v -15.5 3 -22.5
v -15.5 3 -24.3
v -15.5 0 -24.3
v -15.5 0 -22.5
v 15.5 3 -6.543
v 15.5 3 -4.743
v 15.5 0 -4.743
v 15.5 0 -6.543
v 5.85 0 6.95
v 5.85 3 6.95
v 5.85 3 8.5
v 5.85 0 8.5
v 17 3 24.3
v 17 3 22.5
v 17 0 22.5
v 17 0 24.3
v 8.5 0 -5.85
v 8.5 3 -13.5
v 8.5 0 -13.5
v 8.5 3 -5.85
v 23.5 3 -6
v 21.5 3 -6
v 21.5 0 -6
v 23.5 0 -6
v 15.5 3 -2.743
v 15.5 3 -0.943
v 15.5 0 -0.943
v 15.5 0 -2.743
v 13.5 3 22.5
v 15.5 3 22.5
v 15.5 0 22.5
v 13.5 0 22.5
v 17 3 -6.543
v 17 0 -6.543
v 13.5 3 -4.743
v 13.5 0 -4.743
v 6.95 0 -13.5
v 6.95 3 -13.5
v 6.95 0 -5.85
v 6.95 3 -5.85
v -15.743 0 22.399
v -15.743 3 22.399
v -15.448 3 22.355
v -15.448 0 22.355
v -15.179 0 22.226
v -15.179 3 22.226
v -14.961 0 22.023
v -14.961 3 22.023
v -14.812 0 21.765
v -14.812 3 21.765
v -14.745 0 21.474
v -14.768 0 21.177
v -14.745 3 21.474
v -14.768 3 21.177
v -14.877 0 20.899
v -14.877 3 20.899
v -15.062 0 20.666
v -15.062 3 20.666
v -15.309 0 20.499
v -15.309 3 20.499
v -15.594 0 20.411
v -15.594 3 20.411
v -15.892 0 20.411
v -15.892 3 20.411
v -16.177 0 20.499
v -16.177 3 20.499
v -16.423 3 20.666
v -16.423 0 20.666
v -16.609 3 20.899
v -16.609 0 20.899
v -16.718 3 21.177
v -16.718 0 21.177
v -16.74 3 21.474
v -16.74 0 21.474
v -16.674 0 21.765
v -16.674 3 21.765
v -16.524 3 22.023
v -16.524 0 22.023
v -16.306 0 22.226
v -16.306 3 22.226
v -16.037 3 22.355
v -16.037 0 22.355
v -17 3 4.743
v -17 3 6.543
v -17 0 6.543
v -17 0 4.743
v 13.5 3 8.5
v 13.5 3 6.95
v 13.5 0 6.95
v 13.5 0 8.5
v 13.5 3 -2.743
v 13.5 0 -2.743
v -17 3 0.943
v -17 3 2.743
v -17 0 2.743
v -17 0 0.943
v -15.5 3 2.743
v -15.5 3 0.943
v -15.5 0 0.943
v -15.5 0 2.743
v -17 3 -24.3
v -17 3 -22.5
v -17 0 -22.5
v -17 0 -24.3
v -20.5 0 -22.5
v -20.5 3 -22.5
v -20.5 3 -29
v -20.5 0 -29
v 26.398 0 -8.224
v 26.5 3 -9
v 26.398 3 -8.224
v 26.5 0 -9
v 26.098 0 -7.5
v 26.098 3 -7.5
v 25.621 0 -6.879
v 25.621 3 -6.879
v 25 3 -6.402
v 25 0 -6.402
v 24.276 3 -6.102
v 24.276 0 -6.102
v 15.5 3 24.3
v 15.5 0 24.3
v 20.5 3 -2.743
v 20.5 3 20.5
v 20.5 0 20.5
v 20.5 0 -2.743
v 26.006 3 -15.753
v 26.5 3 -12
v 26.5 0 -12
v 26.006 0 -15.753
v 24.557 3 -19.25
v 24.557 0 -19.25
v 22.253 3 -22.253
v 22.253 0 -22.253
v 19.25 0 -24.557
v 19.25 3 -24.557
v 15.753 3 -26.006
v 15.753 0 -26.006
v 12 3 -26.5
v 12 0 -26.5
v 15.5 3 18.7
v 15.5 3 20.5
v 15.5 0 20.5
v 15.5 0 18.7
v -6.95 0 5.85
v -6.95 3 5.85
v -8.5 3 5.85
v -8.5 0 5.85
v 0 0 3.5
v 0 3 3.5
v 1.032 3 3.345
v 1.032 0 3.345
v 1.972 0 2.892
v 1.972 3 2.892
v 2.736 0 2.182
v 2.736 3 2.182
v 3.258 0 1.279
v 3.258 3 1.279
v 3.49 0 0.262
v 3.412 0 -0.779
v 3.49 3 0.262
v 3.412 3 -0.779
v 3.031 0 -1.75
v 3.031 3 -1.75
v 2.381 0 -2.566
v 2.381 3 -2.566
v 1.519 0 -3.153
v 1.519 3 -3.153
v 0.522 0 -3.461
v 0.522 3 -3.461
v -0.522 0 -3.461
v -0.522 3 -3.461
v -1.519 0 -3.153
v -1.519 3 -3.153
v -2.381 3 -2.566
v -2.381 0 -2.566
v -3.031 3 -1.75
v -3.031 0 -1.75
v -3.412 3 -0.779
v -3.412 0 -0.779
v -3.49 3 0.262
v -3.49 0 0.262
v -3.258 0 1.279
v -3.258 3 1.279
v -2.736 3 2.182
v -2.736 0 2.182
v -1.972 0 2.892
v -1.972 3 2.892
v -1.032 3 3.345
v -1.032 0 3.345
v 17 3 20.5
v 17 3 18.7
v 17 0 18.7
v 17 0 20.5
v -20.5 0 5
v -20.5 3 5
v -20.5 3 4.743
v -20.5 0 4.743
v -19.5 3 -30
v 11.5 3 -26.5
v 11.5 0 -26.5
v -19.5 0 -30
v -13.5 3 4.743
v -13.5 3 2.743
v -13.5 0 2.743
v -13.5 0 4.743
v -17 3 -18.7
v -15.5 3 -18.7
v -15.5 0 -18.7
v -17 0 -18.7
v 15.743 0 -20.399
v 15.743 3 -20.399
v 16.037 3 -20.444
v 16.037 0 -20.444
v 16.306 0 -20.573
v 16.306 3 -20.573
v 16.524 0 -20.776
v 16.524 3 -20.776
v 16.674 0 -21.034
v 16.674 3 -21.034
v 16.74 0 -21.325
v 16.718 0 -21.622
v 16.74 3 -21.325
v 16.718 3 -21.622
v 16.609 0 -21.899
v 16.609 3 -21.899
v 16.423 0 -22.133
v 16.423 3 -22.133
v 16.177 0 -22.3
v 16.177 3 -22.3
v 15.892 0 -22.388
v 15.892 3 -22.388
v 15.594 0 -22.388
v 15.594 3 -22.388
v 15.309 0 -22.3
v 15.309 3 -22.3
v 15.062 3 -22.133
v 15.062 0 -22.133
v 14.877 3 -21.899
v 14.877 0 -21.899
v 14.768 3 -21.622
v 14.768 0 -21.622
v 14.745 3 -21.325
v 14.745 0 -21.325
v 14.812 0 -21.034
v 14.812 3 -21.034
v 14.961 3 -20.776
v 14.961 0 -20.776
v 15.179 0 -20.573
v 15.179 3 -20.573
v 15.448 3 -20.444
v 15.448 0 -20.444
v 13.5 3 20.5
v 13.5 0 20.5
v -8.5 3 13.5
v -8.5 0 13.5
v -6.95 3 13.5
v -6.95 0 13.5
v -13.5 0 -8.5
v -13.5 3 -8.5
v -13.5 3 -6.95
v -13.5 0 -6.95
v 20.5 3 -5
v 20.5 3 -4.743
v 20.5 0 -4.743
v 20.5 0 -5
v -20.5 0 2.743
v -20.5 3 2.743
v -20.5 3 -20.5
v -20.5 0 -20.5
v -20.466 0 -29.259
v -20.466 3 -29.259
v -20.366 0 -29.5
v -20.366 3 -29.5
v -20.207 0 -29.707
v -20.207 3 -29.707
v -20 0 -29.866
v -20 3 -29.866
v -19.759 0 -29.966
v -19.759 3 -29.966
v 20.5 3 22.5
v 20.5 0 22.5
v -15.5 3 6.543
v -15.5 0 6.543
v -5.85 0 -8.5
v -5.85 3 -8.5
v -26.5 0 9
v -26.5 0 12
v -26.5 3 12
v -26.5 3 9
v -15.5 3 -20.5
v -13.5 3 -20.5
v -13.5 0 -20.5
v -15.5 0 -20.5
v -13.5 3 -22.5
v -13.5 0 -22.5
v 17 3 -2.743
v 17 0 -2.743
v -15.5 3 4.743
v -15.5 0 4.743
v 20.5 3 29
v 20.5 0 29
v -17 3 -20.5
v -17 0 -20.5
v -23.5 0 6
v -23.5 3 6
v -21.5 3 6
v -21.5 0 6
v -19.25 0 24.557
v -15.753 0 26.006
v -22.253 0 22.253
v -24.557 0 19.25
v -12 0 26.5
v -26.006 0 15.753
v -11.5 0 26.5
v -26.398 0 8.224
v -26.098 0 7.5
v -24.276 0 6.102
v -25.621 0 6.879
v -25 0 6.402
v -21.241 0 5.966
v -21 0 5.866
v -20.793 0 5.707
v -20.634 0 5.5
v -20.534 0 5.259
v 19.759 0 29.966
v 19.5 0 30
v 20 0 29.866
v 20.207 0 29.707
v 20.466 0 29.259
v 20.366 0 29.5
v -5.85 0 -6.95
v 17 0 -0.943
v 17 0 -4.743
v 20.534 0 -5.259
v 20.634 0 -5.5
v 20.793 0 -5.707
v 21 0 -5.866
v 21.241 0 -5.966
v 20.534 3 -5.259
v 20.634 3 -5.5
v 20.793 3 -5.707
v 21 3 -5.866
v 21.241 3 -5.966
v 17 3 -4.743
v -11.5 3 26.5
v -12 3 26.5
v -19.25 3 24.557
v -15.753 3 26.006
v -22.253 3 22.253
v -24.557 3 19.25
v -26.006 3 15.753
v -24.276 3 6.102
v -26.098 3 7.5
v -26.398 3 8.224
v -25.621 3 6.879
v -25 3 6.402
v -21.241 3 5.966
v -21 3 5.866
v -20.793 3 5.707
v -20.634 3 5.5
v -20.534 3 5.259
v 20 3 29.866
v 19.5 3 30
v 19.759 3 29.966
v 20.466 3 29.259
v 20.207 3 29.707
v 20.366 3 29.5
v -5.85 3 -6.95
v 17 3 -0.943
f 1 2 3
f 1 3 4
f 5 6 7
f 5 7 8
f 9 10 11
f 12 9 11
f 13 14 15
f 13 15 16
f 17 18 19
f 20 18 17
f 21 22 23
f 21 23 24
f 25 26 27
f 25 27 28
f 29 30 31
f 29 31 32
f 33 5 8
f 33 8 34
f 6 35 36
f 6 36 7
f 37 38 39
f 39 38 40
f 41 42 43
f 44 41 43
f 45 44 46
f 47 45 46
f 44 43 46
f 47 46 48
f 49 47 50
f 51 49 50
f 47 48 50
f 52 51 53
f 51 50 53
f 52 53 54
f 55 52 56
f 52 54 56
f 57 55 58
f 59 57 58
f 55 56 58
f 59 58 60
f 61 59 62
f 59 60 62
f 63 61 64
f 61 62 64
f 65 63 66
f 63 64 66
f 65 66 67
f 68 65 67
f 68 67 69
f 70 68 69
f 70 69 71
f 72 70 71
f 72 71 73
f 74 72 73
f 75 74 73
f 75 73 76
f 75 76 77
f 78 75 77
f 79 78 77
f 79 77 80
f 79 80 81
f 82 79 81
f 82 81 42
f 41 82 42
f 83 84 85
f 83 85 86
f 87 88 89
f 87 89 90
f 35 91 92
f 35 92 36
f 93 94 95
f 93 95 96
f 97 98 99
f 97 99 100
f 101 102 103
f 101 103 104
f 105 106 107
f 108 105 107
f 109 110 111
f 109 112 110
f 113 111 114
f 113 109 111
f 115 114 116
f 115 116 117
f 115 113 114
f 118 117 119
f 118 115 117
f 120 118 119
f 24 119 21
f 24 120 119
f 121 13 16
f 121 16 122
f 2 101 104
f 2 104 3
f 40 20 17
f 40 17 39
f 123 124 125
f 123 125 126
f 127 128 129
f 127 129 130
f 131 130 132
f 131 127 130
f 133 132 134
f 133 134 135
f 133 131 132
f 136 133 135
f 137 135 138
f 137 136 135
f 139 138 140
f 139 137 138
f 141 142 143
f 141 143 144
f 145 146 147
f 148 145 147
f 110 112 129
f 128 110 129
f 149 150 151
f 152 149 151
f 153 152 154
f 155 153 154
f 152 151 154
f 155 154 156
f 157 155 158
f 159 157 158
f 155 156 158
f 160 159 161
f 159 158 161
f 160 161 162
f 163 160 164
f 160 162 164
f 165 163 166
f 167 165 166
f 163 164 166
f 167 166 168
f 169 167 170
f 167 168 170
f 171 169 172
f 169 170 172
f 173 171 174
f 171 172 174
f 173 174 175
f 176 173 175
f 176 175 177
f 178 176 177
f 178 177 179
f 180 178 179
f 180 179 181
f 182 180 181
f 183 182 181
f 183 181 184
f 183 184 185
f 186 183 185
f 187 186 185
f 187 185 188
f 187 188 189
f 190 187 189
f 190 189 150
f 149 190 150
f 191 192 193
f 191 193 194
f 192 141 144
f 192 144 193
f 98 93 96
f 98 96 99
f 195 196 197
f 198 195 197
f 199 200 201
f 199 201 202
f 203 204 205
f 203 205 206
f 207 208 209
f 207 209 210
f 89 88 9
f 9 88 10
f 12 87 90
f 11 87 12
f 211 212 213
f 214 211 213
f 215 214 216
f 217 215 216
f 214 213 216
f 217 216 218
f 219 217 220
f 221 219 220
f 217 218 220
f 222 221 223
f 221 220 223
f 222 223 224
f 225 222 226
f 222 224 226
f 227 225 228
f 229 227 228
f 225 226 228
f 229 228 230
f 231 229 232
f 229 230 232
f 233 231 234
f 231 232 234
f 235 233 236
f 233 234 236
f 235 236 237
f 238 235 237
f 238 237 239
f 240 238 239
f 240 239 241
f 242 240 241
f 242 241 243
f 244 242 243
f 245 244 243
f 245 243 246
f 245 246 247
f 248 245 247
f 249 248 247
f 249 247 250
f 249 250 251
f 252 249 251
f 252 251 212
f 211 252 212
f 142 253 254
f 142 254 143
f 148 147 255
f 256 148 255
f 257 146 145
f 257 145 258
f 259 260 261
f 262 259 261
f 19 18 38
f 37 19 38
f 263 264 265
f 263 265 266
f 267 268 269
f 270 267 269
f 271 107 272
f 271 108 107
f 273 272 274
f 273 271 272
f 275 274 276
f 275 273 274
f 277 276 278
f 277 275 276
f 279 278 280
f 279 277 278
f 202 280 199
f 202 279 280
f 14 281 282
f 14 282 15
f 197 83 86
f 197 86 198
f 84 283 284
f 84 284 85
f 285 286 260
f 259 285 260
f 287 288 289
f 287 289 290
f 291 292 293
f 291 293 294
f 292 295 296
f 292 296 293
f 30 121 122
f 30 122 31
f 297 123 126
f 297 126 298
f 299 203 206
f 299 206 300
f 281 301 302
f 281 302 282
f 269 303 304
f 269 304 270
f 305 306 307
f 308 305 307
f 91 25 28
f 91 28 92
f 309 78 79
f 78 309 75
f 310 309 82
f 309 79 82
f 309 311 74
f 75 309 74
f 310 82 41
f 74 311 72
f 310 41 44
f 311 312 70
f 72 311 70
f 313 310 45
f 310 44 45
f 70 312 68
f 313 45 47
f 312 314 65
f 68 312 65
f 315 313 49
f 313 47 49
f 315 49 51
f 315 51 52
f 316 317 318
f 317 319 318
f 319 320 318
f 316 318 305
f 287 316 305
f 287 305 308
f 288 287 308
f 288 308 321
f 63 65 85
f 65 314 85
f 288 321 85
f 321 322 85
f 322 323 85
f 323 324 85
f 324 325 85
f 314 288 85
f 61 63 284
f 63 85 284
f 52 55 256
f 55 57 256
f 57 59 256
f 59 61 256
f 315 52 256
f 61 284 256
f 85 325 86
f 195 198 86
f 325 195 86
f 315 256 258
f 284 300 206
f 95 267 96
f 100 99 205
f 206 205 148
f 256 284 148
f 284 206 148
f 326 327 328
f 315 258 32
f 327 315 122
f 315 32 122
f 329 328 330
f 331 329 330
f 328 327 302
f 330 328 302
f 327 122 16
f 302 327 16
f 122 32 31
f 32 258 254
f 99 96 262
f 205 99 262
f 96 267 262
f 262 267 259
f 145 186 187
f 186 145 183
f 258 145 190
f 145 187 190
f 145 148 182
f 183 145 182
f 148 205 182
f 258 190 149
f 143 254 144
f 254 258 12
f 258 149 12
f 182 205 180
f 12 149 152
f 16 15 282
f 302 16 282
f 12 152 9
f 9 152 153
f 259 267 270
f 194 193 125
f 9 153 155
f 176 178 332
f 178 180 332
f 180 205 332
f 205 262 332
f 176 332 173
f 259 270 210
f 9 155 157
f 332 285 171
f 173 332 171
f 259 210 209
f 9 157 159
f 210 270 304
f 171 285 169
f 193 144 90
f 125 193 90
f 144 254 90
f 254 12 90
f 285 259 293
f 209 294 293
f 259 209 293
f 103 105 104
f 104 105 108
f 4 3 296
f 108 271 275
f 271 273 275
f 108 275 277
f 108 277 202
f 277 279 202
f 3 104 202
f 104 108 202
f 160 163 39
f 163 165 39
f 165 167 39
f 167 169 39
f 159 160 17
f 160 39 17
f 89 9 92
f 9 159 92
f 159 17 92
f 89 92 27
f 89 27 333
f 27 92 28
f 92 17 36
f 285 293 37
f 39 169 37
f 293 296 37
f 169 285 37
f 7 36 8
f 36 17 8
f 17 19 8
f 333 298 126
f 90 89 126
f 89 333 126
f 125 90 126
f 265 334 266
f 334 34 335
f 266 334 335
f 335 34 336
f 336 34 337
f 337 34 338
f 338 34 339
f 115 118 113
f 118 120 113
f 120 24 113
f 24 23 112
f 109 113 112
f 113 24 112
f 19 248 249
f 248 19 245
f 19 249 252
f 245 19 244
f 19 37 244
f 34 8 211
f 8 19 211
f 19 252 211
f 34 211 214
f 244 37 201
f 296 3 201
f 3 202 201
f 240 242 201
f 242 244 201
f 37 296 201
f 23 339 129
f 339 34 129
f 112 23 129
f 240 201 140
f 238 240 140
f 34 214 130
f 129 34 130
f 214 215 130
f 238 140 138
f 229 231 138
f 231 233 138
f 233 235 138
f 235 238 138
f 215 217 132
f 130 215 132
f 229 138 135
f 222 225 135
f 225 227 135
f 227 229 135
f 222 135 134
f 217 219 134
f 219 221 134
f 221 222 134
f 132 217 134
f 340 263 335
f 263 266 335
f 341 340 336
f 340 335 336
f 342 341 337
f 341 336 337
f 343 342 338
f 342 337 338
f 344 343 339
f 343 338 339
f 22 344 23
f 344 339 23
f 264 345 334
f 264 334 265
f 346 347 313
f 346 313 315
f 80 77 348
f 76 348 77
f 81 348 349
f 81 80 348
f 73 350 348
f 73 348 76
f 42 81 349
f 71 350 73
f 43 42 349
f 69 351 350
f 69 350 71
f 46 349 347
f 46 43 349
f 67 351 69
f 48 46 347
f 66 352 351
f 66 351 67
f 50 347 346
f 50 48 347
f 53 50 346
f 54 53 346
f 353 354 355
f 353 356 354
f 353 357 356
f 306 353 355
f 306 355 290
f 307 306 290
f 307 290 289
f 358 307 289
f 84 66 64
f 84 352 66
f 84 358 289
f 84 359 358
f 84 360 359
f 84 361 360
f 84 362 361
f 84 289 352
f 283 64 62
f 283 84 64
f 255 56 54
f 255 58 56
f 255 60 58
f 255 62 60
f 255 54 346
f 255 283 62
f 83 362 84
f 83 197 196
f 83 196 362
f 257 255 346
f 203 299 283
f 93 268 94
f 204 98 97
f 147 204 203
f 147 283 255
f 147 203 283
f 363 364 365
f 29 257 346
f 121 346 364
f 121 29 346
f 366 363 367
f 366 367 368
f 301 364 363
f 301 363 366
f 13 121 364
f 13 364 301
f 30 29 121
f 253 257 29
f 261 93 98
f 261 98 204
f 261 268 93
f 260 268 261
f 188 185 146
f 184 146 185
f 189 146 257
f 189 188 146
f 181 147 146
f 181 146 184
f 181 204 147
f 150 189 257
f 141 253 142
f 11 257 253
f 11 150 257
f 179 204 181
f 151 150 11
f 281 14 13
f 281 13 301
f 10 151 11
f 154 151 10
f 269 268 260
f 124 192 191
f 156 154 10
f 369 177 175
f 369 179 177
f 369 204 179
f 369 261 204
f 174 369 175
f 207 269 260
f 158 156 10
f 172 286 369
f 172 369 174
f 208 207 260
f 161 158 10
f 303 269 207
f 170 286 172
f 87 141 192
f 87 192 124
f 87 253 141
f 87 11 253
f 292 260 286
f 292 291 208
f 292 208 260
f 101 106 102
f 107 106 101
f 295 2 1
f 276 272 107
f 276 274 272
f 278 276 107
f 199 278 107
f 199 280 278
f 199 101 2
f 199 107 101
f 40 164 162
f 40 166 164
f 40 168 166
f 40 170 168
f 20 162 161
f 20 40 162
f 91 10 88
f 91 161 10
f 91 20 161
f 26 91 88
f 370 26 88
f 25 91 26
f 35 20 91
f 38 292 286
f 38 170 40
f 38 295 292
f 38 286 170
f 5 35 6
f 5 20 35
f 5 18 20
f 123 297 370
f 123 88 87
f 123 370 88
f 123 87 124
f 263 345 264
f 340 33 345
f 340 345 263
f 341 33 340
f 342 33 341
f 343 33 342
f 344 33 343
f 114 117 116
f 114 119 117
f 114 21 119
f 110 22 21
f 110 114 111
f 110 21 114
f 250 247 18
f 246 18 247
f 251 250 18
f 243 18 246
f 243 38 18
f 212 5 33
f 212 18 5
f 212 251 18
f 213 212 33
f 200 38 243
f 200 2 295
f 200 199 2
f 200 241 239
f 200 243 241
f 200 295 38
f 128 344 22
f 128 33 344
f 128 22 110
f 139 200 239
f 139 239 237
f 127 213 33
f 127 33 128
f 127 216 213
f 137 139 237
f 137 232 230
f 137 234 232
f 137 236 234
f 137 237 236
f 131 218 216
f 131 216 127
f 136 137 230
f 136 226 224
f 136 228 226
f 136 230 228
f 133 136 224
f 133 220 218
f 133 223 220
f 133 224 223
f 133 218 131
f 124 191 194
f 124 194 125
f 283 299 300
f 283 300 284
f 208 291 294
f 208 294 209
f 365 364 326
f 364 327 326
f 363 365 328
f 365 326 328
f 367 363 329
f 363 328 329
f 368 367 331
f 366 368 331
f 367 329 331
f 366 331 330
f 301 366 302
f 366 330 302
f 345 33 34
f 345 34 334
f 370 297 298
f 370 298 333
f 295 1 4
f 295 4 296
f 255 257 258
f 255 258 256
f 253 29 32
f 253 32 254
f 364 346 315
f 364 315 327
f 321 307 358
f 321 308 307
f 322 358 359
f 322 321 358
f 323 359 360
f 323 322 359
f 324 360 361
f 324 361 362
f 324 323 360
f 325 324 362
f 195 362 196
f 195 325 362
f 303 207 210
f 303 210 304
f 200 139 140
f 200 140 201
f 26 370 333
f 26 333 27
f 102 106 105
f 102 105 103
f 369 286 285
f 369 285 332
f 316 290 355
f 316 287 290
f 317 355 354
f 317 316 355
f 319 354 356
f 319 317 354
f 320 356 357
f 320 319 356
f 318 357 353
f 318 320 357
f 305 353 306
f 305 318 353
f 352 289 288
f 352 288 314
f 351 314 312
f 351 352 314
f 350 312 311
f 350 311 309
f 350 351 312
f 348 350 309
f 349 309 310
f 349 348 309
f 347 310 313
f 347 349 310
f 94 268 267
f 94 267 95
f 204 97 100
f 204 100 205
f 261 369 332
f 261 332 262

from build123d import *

# Parameters (mm, degrees)
ESBO_O1_W                = 53
ESBO_O1_H                = 60
RESSALTO_EXTRUS_O1_DEPTH = 3
ESBO_O4_W                = 1.55
ESBO_O4_H                = 7.65
ESBO_O4_W_2              = 7.65
ESBO_O4_H_2              = 1.55
CORTE_EXTRUS_O2_DEPTH    = 10
ESBO_O5_R                = 1
CORTE_EXTRUS_O3_DEPTH    = 41.140378673
ESBO_O7_R                = 3.5
CORTE_EXTRUS_O6_DEPTH    = 41.140378673
ESBO_O8_W                = 6
ESBO_O8_H                = 36
CORTE_EXTRUS_O7_DEPTH    = 41.140378673
FILETE2_R                = 3
FILETE3_R                = 1
CORTE_EXTRUS_O8_DEPTH    = 41.140378673
CORTE_EXTRUS_O9_DEPTH    = 41.140378673


with BuildPart() as part:
    # Esboço1 → Ressalto-extrusão1 (new body)
    with BuildSketch(Plane(origin=(0, 0, 0), x_dir=(1, 0, 0), z_dir=(0, 1, 0))):
        Rectangle(ESBO_O1_W, ESBO_O1_H)
    extrude(amount=RESSALTO_EXTRUS_O1_DEPTH)

    # Esboço4 → Corte-extrusão2 (cut)
    with BuildSketch(Plane(origin=(0, 3, 0), x_dir=(-1, 0, 0), z_dir=(0, 1, 0))):
        with Locations((-7.725, -9.675)):
            Rectangle(ESBO_O4_W, ESBO_O4_H)
        with Locations((-9.675, 7.725)):
            Rectangle(ESBO_O4_W_2, ESBO_O4_H_2)
        with Locations((7.725, 9.675)):
            Rectangle(ESBO_O4_W, ESBO_O4_H)
        with Locations((9.675, -7.725)):
            Rectangle(ESBO_O4_W_2, ESBO_O4_H_2)
    extrude(amount=-CORTE_EXTRUS_O2_DEPTH, mode=Mode.SUBTRACT)

    # Esboço5 → Corte-extrusão3 (cut, through all)
    with BuildSketch(Plane(origin=(0, 3, 0), x_dir=(1, 0, 0), z_dir=(0, 1, 0))):
        with Locations(Location((-15.742640687, -21.399494937, 0), (0, 0, 270))):
            Circle(ESBO_O5_R)
        with Locations(Location((15.742640687, 21.399494937, 0), (0, 0, 270))):
            Circle(ESBO_O5_R)
    extrude(amount=-CORTE_EXTRUS_O3_DEPTH, mode=Mode.SUBTRACT)

    # Esboço7 → Corte-extrusão6 (cut, through all)
    with BuildSketch(Plane(origin=(0, 3, 0), x_dir=(1, 0, 0), z_dir=(0, 1, 0))):
        with Locations(Location((0, 0, 0), (0, 0, 270))):
            Circle(ESBO_O7_R)
    extrude(amount=-CORTE_EXTRUS_O6_DEPTH, mode=Mode.SUBTRACT)

    # Esboço8 → Corte-extrusão7 (cut, through all)
    with BuildSketch(Plane(origin=(0, 3, 0), x_dir=(1, 0, 0), z_dir=(0, 1, 0))):
        with Locations((23.5, -12)):
            Rectangle(ESBO_O8_W, ESBO_O8_H)
        with Locations((-23.5, 12)):
            Rectangle(ESBO_O8_W, ESBO_O8_H)
    extrude(amount=-CORTE_EXTRUS_O7_DEPTH, mode=Mode.SUBTRACT)

    # Filete2
    filete2_edges = [part.edges().sort_by_distance(p)[0] for p in [
        (26.5, 1.5, -6),
        (-26.5, 1.5, 6),
    ]]
    fillet(filete2_edges, radius=FILETE2_R)

    # Filete3
    filete3_edges = [part.edges().sort_by_distance(p)[0] for p in [
        (20.5, 1.5, 30),
        (20.5, 1.5, -6),
        (-20.5, 1.5, -30),
        (-20.5, 1.5, 6),
    ]]
    fillet(filete3_edges, radius=FILETE3_R)

    # Esboço9 → Corte-extrusão8 (cut, through all)
    with BuildSketch(Plane(origin=(0, 3, 0), x_dir=(1, 0, 0), z_dir=(0, 1, 0))):
        Polygon((-13.5, 20.5), (-15.5, 20.5), (-15.5, 18.7), (-17, 18.7), (-17, 20.5), (-20.5, 20.5), (-20.5, 22.5), (-17, 22.5), (-17, 24.3), (-15.5, 24.3), (-15.5, 22.5), (-13.5, 22.5), align=None)
        Polygon((-13.5, -4.74347437), (-15.5, -4.74347437), (-15.5, -6.54347437), (-17, -6.54347437), (-17, -4.74347437), (-20.5, -4.74347437), (-20.5, -2.74347437), (-17, -2.74347437), (-17, -0.94347437), (-15.5, -0.94347437), (-15.5, -2.74347437), (-13.5, -2.74347437), align=None)
        Polygon((13.5, -20.5), (15.5, -20.5), (15.5, -18.7), (17, -18.7), (17, -20.5), (20.5, -20.5), (20.5, -22.5), (17, -22.5), (17, -24.3), (15.5, -24.3), (15.5, -22.5), (13.5, -22.5), align=None)
        Polygon((13.5, 4.74347437), (15.5, 4.74347437), (15.5, 6.54347437), (17, 6.54347437), (17, 4.74347437), (20.5, 4.74347437), (20.5, 2.74347437), (17, 2.74347437), (17, 0.94347437), (15.5, 0.94347437), (15.5, 2.74347437), (13.5, 2.74347437), align=None)
    extrude(amount=-CORTE_EXTRUS_O8_DEPTH, mode=Mode.SUBTRACT)

    # Esboço10 → Corte-extrusão9 (cut, through all)
    with BuildSketch(Plane(origin=(0, 3, 0), x_dir=(1, 0, 0), z_dir=(0, 1, 0))):
        with BuildLine():
            Line((26.5, 11.5), (26.5, 12))
            ThreePointArc((26.5, 12), (22.253048327, 22.253048327), (12, 26.5))
            Line((12, 26.5), (11.5, 26.5))
            Line((11.5, 26.5), (-19.5, 30))
            Line((-19.5, 30), (-19.5, 39.997592749))
            Line((-19.5, 39.997592749), (32.53430666, 39.997592749))
            Line((32.53430666, 39.997592749), (32.53430666, 11.5))
            Line((32.53430666, 11.5), (26.5, 11.5))
        make_face()
        with BuildLine():
            Line((-26.5, -11.5), (-26.5, -12))
            ThreePointArc((-26.5, -12), (-22.253048327, -22.253048327), (-12, -26.5))
            Line((-12, -26.5), (-11.5, -26.5))
            Line((-11.5, -26.5), (19.5, -30))
            Line((19.5, -30), (19.5, -39.997592749))
            Line((19.5, -39.997592749), (-32.53430666, -39.997592749))
            Line((-32.53430666, -39.997592749), (-32.53430666, -11.5))
            Line((-32.53430666, -11.5), (-26.5, -11.5))
        make_face()
    extrude(amount=-CORTE_EXTRUS_O9_DEPTH, mode=Mode.SUBTRACT)


solid = part.part
